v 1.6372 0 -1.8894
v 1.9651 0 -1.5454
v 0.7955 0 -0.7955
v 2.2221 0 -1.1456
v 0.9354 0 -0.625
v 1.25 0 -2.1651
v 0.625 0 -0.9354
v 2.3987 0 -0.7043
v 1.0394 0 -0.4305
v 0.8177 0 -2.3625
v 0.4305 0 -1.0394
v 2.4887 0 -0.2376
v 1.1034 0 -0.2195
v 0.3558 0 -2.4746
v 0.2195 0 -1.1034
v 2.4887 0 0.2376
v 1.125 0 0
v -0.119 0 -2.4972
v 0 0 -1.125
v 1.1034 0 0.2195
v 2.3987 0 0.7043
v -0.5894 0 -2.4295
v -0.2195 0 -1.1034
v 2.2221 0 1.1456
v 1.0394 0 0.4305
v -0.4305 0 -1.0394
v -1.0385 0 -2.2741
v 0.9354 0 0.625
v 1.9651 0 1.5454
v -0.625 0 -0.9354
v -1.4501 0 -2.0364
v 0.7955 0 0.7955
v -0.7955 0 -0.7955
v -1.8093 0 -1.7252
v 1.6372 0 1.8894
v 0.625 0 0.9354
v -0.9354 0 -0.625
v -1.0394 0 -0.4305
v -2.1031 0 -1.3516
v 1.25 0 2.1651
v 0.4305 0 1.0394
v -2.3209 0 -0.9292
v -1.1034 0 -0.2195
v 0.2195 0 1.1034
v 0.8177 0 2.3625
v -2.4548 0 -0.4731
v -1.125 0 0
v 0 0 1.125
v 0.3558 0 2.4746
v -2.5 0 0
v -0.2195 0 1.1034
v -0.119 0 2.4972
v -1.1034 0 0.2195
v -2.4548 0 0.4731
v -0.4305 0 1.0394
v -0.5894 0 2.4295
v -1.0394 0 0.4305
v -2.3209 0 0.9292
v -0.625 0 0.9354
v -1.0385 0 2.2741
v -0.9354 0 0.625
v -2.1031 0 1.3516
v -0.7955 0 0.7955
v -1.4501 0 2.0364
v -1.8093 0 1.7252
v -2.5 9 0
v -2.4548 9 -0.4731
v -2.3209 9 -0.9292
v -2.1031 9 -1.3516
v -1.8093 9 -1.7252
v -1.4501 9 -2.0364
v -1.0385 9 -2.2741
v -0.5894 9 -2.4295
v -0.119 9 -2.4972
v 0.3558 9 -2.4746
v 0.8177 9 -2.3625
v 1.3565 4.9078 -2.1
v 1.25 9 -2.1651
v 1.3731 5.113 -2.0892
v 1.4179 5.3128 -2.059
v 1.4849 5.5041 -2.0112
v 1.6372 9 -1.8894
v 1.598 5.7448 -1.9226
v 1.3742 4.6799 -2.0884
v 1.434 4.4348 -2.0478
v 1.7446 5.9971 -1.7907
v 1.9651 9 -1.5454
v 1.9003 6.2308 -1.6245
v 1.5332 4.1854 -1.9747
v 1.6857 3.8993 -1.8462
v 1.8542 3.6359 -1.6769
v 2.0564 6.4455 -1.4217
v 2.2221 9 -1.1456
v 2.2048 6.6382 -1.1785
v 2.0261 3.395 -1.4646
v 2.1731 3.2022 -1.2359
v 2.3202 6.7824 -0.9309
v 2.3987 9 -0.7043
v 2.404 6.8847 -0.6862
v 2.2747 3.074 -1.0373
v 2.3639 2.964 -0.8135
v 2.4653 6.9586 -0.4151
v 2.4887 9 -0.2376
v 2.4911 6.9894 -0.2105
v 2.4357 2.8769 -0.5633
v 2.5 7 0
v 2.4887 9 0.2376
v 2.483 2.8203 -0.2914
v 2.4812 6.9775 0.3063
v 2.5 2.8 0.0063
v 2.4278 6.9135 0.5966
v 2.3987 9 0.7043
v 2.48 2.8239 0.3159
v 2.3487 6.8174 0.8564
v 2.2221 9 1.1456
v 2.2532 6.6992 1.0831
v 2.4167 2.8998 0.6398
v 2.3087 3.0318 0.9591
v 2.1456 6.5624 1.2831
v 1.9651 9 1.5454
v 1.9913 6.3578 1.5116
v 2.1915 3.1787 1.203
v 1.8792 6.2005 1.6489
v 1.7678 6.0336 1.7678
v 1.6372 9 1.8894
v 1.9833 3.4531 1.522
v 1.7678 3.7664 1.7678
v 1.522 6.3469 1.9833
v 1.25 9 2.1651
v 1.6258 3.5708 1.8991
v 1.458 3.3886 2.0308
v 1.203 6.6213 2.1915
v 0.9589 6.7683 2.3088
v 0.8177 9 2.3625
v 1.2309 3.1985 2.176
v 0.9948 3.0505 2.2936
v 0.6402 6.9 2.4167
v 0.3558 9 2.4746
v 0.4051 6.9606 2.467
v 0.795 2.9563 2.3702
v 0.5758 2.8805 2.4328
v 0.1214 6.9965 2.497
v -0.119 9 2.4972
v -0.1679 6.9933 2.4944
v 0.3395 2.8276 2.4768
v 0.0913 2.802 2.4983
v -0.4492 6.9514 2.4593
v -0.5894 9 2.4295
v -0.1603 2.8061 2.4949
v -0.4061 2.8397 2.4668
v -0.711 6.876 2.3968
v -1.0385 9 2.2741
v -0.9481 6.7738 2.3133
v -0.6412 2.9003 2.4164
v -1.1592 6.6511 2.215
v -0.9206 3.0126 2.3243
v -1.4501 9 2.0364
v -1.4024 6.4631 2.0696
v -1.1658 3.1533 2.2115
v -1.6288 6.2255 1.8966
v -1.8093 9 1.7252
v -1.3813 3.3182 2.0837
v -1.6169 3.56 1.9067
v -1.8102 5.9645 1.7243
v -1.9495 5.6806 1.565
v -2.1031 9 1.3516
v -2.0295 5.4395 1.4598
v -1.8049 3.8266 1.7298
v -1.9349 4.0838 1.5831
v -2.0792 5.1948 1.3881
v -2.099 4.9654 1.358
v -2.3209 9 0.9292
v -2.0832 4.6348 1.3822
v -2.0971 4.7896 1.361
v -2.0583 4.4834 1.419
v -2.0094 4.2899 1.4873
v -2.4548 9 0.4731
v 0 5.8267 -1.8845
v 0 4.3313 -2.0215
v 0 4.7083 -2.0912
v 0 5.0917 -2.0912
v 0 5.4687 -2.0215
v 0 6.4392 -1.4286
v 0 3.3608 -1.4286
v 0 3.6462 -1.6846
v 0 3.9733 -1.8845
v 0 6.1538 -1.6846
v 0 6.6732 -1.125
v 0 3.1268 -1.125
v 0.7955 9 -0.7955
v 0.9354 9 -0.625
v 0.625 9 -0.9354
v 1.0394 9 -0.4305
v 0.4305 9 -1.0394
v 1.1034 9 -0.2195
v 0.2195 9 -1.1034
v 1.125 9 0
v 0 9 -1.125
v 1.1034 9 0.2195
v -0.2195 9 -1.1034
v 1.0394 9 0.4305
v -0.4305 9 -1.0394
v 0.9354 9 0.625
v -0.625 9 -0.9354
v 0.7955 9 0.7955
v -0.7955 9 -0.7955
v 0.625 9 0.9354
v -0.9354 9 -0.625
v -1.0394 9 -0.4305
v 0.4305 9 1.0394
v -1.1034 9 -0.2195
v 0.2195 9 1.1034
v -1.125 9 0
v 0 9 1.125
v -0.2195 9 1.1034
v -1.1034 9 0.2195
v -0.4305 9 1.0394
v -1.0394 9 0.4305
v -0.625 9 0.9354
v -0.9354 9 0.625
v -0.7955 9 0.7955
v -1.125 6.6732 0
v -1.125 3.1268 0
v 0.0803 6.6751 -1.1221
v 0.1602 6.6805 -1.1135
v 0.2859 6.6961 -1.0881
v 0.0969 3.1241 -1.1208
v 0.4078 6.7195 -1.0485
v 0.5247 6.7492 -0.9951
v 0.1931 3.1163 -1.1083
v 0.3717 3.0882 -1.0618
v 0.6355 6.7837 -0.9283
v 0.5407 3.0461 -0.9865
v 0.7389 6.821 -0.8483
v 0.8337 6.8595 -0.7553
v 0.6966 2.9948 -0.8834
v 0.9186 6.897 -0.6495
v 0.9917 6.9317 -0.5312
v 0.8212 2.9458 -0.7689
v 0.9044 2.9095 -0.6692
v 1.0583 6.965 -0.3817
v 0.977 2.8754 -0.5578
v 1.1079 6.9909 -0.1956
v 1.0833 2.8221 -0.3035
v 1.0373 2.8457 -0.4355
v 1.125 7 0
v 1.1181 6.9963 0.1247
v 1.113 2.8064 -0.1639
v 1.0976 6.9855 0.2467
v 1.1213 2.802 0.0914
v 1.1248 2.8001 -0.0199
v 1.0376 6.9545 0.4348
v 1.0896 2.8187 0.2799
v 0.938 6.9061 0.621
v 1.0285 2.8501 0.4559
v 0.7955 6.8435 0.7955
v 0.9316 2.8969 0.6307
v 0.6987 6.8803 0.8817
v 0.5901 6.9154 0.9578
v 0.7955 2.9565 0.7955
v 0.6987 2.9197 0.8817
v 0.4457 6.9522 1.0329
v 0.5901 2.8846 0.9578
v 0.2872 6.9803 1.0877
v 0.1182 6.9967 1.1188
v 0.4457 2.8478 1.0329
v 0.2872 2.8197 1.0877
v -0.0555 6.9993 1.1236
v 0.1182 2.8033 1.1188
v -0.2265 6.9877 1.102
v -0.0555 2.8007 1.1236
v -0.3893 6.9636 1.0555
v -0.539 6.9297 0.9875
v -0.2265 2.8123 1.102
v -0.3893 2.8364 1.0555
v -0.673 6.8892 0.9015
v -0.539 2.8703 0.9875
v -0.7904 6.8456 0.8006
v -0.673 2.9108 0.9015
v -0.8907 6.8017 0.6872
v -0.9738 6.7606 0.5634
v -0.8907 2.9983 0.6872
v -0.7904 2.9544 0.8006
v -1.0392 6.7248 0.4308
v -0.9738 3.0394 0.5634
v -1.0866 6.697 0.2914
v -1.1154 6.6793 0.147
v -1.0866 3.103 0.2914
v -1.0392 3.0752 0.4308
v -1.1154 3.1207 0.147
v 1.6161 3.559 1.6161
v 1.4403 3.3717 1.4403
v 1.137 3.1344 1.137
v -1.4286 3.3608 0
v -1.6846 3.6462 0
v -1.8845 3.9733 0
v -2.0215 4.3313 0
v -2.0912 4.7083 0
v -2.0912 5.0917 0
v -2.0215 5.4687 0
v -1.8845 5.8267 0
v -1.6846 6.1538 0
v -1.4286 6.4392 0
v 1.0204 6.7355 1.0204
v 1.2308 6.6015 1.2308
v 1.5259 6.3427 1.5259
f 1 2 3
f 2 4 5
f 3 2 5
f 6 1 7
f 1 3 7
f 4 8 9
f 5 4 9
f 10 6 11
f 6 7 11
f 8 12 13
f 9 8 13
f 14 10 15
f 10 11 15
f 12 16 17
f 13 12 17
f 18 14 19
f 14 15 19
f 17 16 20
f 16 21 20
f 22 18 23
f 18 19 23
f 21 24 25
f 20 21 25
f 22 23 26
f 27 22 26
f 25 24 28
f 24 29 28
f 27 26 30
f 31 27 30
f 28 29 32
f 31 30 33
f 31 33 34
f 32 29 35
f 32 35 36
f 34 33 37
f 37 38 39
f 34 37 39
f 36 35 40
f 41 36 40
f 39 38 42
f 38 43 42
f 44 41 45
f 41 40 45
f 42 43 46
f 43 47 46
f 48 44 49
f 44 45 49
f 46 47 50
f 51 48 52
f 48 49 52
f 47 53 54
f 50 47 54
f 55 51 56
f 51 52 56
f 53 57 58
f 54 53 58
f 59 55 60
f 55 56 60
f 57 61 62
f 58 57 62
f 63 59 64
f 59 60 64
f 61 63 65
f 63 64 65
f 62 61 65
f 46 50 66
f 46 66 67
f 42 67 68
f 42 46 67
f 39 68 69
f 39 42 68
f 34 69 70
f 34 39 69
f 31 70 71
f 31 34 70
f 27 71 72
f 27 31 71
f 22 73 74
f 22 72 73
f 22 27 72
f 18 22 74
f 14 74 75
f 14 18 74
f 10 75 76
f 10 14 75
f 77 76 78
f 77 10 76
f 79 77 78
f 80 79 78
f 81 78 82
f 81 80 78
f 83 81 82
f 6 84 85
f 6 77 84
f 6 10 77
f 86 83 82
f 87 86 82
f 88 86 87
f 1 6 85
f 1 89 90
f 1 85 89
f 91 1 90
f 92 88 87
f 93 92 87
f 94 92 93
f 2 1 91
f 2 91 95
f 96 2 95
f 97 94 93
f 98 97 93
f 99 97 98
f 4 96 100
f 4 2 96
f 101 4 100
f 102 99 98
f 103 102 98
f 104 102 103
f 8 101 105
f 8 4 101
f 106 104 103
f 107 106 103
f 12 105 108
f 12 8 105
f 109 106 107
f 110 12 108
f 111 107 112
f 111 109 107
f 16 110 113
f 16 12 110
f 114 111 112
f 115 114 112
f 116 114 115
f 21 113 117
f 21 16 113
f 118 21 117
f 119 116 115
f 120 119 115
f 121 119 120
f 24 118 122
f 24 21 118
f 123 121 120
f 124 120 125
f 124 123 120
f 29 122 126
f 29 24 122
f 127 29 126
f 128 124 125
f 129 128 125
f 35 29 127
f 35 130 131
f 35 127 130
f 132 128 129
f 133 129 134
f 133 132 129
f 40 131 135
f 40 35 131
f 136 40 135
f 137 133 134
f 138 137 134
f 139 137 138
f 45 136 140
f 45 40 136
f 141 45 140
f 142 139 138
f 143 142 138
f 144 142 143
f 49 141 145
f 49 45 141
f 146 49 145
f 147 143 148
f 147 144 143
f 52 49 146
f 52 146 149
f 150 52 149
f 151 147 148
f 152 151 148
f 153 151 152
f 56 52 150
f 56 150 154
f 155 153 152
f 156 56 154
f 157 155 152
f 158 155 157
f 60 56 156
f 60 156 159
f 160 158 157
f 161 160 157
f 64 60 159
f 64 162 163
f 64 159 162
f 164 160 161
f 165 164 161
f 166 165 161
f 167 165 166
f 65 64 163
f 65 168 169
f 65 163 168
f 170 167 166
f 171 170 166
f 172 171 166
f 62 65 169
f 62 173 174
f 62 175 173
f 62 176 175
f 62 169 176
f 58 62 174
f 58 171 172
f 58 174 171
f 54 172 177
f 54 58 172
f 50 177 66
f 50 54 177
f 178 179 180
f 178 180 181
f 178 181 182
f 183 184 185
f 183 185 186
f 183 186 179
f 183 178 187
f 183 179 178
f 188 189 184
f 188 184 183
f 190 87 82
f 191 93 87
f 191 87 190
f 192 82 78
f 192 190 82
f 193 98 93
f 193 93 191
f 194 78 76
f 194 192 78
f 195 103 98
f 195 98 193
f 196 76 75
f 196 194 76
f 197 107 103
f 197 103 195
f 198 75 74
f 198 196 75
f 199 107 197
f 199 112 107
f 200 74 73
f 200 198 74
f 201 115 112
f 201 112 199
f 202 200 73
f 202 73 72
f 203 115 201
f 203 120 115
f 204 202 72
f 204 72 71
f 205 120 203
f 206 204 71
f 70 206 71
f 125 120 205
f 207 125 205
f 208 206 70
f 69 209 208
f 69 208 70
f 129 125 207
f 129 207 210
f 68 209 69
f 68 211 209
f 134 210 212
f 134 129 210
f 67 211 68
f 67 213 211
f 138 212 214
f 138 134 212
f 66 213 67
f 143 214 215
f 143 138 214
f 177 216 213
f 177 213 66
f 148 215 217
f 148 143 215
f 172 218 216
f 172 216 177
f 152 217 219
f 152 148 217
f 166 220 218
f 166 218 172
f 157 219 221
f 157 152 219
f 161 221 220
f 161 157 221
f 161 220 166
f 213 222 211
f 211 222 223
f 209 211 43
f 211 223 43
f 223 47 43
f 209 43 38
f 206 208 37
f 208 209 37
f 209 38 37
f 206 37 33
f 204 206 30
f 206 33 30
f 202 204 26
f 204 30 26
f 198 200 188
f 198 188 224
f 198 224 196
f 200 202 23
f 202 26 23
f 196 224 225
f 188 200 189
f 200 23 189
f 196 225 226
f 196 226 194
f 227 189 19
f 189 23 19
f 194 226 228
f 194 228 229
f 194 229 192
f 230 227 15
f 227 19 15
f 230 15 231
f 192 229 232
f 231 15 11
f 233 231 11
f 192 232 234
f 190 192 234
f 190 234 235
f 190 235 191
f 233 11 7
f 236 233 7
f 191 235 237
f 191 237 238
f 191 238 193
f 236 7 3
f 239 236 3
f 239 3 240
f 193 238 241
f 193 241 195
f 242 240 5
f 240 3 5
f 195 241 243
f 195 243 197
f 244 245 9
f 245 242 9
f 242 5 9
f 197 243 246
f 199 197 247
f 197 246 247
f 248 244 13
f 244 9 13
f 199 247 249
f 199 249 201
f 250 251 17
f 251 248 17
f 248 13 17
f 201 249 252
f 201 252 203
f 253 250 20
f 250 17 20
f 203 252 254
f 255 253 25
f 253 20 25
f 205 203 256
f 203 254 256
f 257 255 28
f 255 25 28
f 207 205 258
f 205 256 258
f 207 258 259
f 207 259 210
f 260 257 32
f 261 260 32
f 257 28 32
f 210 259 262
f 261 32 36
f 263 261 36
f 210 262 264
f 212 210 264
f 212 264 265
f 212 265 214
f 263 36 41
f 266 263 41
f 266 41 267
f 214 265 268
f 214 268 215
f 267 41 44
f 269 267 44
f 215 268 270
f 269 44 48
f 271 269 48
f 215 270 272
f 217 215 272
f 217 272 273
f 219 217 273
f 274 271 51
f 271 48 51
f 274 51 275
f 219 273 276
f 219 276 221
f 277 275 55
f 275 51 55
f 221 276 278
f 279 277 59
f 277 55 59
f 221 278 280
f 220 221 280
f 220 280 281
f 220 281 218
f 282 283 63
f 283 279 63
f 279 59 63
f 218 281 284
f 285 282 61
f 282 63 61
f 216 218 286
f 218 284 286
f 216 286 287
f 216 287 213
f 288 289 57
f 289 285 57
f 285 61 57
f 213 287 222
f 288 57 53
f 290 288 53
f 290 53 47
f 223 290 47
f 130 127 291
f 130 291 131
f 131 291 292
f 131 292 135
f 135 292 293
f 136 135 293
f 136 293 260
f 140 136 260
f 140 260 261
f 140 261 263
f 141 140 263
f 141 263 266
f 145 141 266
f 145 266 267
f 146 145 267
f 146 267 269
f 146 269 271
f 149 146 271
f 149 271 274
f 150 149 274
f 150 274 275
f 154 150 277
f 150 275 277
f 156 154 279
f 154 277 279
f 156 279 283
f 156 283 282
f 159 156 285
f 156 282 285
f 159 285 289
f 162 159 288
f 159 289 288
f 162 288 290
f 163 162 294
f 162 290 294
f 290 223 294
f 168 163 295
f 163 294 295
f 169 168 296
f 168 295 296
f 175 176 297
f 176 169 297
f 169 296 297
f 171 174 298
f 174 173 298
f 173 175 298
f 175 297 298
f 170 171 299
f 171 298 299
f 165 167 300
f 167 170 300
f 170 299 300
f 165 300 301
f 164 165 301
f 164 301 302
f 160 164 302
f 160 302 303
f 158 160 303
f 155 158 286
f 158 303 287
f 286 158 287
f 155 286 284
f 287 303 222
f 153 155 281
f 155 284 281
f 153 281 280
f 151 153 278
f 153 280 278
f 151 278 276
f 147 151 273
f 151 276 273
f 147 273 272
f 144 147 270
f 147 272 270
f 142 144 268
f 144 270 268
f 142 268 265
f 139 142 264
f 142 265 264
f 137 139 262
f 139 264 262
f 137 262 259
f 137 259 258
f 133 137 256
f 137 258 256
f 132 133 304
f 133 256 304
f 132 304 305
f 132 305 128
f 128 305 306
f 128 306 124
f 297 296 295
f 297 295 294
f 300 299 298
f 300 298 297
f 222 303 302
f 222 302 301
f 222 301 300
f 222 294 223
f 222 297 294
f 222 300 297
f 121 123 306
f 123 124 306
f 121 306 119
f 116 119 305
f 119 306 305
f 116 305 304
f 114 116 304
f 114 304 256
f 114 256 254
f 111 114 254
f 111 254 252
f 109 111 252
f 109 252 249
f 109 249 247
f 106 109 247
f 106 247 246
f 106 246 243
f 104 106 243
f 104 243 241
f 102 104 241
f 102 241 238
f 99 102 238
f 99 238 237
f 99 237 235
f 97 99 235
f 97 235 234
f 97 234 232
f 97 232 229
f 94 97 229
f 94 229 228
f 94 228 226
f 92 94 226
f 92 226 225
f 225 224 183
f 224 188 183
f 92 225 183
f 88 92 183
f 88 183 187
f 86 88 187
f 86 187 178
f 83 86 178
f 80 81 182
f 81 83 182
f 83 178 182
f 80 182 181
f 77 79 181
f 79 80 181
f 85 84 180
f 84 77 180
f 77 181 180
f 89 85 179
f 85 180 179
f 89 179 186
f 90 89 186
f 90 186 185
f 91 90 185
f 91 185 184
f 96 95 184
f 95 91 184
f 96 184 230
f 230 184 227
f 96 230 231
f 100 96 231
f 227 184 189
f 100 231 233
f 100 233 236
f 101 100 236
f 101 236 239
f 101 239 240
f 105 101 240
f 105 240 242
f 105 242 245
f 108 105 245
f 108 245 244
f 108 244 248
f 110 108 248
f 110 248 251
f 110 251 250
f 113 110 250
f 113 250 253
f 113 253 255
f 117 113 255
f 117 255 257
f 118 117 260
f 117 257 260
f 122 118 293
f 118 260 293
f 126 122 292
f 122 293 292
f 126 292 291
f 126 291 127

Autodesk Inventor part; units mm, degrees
ref_plane "YZ Plane" through (0, 0, 0) normal (1, 0, 0) x (0, 1, 0)
ref_plane "XZ Plane" through (0, 0, 0) normal (0, 1, 0) x (-1, 0, 0)
ref_plane "XY Plane" through (0, 0, 0) normal (0, 0, 1) x (1, 0, 0)
sketch "Sketch1" plane through (0, 0, 0) normal (0, 1, 0) x (-1, 0, 0)
  circle A0 centre (0, 0) radius 1.125
  circle A1 centre (0, 0) radius 2.5
  dimension "d0" = 2.25
  dimension "d1" = 5
extrude "Extrusion1" add sketch "Sketch1" along normal blind 9
sketch "Sketch2" plane through (0, 0, 0) normal (0, 0, 1) x (1, 0, 0)
  line L0 (2.5, 9) -> (-2.5, 9) projected
  line L1 (2.5, 0) -> (-2.5, 0) projected
  line L2 (-2.5, 0) -> (-2.5, 9) projected
  line L3 (-2.5, 7) -> (2.5173, 7)
  line L4 (2.5, 9) -> (-2.5, 9) projected
  line L5 (0, 9) -> (0, 0)
  circle A0 centre (0, 4.9) radius 2.1
  dimension "d4" = 2
  dimension "d5" = 4.2
extrude "Extrusion2" cut sketch "Sketch2" along normal blind 12 contours A0 L5 | L5 A0
sketch "Sketch3" plane through (0, 0, 0) normal (1, 0, 0) x (0, 1, 0)
  line L0 (9, -2.5) -> (9, 2.5) projected
  line L1 (0, -2.5) -> (0, 2.5) projected
  line L2 (0, 2.5) -> (9, 2.5) projected
  line L3 (7, 2.5) -> (7, -2.525)
  line L4 (9, 1.125) -> (9, -1.125) projected
  line L5 (9, 0) -> (0, 0)
  circle A0 centre (4.9, 0) radius 2.1
  point P0 (4.9, 1.3565)
  dimension "d8" = 2
  dimension "d9" = 4.2
extrude "Extrusion3" cut sketch "Sketch3" along normal up to next contours A0 L5 | L5 A0
properties part number "motor_shaft_adapter" material "ABS Plastic"
